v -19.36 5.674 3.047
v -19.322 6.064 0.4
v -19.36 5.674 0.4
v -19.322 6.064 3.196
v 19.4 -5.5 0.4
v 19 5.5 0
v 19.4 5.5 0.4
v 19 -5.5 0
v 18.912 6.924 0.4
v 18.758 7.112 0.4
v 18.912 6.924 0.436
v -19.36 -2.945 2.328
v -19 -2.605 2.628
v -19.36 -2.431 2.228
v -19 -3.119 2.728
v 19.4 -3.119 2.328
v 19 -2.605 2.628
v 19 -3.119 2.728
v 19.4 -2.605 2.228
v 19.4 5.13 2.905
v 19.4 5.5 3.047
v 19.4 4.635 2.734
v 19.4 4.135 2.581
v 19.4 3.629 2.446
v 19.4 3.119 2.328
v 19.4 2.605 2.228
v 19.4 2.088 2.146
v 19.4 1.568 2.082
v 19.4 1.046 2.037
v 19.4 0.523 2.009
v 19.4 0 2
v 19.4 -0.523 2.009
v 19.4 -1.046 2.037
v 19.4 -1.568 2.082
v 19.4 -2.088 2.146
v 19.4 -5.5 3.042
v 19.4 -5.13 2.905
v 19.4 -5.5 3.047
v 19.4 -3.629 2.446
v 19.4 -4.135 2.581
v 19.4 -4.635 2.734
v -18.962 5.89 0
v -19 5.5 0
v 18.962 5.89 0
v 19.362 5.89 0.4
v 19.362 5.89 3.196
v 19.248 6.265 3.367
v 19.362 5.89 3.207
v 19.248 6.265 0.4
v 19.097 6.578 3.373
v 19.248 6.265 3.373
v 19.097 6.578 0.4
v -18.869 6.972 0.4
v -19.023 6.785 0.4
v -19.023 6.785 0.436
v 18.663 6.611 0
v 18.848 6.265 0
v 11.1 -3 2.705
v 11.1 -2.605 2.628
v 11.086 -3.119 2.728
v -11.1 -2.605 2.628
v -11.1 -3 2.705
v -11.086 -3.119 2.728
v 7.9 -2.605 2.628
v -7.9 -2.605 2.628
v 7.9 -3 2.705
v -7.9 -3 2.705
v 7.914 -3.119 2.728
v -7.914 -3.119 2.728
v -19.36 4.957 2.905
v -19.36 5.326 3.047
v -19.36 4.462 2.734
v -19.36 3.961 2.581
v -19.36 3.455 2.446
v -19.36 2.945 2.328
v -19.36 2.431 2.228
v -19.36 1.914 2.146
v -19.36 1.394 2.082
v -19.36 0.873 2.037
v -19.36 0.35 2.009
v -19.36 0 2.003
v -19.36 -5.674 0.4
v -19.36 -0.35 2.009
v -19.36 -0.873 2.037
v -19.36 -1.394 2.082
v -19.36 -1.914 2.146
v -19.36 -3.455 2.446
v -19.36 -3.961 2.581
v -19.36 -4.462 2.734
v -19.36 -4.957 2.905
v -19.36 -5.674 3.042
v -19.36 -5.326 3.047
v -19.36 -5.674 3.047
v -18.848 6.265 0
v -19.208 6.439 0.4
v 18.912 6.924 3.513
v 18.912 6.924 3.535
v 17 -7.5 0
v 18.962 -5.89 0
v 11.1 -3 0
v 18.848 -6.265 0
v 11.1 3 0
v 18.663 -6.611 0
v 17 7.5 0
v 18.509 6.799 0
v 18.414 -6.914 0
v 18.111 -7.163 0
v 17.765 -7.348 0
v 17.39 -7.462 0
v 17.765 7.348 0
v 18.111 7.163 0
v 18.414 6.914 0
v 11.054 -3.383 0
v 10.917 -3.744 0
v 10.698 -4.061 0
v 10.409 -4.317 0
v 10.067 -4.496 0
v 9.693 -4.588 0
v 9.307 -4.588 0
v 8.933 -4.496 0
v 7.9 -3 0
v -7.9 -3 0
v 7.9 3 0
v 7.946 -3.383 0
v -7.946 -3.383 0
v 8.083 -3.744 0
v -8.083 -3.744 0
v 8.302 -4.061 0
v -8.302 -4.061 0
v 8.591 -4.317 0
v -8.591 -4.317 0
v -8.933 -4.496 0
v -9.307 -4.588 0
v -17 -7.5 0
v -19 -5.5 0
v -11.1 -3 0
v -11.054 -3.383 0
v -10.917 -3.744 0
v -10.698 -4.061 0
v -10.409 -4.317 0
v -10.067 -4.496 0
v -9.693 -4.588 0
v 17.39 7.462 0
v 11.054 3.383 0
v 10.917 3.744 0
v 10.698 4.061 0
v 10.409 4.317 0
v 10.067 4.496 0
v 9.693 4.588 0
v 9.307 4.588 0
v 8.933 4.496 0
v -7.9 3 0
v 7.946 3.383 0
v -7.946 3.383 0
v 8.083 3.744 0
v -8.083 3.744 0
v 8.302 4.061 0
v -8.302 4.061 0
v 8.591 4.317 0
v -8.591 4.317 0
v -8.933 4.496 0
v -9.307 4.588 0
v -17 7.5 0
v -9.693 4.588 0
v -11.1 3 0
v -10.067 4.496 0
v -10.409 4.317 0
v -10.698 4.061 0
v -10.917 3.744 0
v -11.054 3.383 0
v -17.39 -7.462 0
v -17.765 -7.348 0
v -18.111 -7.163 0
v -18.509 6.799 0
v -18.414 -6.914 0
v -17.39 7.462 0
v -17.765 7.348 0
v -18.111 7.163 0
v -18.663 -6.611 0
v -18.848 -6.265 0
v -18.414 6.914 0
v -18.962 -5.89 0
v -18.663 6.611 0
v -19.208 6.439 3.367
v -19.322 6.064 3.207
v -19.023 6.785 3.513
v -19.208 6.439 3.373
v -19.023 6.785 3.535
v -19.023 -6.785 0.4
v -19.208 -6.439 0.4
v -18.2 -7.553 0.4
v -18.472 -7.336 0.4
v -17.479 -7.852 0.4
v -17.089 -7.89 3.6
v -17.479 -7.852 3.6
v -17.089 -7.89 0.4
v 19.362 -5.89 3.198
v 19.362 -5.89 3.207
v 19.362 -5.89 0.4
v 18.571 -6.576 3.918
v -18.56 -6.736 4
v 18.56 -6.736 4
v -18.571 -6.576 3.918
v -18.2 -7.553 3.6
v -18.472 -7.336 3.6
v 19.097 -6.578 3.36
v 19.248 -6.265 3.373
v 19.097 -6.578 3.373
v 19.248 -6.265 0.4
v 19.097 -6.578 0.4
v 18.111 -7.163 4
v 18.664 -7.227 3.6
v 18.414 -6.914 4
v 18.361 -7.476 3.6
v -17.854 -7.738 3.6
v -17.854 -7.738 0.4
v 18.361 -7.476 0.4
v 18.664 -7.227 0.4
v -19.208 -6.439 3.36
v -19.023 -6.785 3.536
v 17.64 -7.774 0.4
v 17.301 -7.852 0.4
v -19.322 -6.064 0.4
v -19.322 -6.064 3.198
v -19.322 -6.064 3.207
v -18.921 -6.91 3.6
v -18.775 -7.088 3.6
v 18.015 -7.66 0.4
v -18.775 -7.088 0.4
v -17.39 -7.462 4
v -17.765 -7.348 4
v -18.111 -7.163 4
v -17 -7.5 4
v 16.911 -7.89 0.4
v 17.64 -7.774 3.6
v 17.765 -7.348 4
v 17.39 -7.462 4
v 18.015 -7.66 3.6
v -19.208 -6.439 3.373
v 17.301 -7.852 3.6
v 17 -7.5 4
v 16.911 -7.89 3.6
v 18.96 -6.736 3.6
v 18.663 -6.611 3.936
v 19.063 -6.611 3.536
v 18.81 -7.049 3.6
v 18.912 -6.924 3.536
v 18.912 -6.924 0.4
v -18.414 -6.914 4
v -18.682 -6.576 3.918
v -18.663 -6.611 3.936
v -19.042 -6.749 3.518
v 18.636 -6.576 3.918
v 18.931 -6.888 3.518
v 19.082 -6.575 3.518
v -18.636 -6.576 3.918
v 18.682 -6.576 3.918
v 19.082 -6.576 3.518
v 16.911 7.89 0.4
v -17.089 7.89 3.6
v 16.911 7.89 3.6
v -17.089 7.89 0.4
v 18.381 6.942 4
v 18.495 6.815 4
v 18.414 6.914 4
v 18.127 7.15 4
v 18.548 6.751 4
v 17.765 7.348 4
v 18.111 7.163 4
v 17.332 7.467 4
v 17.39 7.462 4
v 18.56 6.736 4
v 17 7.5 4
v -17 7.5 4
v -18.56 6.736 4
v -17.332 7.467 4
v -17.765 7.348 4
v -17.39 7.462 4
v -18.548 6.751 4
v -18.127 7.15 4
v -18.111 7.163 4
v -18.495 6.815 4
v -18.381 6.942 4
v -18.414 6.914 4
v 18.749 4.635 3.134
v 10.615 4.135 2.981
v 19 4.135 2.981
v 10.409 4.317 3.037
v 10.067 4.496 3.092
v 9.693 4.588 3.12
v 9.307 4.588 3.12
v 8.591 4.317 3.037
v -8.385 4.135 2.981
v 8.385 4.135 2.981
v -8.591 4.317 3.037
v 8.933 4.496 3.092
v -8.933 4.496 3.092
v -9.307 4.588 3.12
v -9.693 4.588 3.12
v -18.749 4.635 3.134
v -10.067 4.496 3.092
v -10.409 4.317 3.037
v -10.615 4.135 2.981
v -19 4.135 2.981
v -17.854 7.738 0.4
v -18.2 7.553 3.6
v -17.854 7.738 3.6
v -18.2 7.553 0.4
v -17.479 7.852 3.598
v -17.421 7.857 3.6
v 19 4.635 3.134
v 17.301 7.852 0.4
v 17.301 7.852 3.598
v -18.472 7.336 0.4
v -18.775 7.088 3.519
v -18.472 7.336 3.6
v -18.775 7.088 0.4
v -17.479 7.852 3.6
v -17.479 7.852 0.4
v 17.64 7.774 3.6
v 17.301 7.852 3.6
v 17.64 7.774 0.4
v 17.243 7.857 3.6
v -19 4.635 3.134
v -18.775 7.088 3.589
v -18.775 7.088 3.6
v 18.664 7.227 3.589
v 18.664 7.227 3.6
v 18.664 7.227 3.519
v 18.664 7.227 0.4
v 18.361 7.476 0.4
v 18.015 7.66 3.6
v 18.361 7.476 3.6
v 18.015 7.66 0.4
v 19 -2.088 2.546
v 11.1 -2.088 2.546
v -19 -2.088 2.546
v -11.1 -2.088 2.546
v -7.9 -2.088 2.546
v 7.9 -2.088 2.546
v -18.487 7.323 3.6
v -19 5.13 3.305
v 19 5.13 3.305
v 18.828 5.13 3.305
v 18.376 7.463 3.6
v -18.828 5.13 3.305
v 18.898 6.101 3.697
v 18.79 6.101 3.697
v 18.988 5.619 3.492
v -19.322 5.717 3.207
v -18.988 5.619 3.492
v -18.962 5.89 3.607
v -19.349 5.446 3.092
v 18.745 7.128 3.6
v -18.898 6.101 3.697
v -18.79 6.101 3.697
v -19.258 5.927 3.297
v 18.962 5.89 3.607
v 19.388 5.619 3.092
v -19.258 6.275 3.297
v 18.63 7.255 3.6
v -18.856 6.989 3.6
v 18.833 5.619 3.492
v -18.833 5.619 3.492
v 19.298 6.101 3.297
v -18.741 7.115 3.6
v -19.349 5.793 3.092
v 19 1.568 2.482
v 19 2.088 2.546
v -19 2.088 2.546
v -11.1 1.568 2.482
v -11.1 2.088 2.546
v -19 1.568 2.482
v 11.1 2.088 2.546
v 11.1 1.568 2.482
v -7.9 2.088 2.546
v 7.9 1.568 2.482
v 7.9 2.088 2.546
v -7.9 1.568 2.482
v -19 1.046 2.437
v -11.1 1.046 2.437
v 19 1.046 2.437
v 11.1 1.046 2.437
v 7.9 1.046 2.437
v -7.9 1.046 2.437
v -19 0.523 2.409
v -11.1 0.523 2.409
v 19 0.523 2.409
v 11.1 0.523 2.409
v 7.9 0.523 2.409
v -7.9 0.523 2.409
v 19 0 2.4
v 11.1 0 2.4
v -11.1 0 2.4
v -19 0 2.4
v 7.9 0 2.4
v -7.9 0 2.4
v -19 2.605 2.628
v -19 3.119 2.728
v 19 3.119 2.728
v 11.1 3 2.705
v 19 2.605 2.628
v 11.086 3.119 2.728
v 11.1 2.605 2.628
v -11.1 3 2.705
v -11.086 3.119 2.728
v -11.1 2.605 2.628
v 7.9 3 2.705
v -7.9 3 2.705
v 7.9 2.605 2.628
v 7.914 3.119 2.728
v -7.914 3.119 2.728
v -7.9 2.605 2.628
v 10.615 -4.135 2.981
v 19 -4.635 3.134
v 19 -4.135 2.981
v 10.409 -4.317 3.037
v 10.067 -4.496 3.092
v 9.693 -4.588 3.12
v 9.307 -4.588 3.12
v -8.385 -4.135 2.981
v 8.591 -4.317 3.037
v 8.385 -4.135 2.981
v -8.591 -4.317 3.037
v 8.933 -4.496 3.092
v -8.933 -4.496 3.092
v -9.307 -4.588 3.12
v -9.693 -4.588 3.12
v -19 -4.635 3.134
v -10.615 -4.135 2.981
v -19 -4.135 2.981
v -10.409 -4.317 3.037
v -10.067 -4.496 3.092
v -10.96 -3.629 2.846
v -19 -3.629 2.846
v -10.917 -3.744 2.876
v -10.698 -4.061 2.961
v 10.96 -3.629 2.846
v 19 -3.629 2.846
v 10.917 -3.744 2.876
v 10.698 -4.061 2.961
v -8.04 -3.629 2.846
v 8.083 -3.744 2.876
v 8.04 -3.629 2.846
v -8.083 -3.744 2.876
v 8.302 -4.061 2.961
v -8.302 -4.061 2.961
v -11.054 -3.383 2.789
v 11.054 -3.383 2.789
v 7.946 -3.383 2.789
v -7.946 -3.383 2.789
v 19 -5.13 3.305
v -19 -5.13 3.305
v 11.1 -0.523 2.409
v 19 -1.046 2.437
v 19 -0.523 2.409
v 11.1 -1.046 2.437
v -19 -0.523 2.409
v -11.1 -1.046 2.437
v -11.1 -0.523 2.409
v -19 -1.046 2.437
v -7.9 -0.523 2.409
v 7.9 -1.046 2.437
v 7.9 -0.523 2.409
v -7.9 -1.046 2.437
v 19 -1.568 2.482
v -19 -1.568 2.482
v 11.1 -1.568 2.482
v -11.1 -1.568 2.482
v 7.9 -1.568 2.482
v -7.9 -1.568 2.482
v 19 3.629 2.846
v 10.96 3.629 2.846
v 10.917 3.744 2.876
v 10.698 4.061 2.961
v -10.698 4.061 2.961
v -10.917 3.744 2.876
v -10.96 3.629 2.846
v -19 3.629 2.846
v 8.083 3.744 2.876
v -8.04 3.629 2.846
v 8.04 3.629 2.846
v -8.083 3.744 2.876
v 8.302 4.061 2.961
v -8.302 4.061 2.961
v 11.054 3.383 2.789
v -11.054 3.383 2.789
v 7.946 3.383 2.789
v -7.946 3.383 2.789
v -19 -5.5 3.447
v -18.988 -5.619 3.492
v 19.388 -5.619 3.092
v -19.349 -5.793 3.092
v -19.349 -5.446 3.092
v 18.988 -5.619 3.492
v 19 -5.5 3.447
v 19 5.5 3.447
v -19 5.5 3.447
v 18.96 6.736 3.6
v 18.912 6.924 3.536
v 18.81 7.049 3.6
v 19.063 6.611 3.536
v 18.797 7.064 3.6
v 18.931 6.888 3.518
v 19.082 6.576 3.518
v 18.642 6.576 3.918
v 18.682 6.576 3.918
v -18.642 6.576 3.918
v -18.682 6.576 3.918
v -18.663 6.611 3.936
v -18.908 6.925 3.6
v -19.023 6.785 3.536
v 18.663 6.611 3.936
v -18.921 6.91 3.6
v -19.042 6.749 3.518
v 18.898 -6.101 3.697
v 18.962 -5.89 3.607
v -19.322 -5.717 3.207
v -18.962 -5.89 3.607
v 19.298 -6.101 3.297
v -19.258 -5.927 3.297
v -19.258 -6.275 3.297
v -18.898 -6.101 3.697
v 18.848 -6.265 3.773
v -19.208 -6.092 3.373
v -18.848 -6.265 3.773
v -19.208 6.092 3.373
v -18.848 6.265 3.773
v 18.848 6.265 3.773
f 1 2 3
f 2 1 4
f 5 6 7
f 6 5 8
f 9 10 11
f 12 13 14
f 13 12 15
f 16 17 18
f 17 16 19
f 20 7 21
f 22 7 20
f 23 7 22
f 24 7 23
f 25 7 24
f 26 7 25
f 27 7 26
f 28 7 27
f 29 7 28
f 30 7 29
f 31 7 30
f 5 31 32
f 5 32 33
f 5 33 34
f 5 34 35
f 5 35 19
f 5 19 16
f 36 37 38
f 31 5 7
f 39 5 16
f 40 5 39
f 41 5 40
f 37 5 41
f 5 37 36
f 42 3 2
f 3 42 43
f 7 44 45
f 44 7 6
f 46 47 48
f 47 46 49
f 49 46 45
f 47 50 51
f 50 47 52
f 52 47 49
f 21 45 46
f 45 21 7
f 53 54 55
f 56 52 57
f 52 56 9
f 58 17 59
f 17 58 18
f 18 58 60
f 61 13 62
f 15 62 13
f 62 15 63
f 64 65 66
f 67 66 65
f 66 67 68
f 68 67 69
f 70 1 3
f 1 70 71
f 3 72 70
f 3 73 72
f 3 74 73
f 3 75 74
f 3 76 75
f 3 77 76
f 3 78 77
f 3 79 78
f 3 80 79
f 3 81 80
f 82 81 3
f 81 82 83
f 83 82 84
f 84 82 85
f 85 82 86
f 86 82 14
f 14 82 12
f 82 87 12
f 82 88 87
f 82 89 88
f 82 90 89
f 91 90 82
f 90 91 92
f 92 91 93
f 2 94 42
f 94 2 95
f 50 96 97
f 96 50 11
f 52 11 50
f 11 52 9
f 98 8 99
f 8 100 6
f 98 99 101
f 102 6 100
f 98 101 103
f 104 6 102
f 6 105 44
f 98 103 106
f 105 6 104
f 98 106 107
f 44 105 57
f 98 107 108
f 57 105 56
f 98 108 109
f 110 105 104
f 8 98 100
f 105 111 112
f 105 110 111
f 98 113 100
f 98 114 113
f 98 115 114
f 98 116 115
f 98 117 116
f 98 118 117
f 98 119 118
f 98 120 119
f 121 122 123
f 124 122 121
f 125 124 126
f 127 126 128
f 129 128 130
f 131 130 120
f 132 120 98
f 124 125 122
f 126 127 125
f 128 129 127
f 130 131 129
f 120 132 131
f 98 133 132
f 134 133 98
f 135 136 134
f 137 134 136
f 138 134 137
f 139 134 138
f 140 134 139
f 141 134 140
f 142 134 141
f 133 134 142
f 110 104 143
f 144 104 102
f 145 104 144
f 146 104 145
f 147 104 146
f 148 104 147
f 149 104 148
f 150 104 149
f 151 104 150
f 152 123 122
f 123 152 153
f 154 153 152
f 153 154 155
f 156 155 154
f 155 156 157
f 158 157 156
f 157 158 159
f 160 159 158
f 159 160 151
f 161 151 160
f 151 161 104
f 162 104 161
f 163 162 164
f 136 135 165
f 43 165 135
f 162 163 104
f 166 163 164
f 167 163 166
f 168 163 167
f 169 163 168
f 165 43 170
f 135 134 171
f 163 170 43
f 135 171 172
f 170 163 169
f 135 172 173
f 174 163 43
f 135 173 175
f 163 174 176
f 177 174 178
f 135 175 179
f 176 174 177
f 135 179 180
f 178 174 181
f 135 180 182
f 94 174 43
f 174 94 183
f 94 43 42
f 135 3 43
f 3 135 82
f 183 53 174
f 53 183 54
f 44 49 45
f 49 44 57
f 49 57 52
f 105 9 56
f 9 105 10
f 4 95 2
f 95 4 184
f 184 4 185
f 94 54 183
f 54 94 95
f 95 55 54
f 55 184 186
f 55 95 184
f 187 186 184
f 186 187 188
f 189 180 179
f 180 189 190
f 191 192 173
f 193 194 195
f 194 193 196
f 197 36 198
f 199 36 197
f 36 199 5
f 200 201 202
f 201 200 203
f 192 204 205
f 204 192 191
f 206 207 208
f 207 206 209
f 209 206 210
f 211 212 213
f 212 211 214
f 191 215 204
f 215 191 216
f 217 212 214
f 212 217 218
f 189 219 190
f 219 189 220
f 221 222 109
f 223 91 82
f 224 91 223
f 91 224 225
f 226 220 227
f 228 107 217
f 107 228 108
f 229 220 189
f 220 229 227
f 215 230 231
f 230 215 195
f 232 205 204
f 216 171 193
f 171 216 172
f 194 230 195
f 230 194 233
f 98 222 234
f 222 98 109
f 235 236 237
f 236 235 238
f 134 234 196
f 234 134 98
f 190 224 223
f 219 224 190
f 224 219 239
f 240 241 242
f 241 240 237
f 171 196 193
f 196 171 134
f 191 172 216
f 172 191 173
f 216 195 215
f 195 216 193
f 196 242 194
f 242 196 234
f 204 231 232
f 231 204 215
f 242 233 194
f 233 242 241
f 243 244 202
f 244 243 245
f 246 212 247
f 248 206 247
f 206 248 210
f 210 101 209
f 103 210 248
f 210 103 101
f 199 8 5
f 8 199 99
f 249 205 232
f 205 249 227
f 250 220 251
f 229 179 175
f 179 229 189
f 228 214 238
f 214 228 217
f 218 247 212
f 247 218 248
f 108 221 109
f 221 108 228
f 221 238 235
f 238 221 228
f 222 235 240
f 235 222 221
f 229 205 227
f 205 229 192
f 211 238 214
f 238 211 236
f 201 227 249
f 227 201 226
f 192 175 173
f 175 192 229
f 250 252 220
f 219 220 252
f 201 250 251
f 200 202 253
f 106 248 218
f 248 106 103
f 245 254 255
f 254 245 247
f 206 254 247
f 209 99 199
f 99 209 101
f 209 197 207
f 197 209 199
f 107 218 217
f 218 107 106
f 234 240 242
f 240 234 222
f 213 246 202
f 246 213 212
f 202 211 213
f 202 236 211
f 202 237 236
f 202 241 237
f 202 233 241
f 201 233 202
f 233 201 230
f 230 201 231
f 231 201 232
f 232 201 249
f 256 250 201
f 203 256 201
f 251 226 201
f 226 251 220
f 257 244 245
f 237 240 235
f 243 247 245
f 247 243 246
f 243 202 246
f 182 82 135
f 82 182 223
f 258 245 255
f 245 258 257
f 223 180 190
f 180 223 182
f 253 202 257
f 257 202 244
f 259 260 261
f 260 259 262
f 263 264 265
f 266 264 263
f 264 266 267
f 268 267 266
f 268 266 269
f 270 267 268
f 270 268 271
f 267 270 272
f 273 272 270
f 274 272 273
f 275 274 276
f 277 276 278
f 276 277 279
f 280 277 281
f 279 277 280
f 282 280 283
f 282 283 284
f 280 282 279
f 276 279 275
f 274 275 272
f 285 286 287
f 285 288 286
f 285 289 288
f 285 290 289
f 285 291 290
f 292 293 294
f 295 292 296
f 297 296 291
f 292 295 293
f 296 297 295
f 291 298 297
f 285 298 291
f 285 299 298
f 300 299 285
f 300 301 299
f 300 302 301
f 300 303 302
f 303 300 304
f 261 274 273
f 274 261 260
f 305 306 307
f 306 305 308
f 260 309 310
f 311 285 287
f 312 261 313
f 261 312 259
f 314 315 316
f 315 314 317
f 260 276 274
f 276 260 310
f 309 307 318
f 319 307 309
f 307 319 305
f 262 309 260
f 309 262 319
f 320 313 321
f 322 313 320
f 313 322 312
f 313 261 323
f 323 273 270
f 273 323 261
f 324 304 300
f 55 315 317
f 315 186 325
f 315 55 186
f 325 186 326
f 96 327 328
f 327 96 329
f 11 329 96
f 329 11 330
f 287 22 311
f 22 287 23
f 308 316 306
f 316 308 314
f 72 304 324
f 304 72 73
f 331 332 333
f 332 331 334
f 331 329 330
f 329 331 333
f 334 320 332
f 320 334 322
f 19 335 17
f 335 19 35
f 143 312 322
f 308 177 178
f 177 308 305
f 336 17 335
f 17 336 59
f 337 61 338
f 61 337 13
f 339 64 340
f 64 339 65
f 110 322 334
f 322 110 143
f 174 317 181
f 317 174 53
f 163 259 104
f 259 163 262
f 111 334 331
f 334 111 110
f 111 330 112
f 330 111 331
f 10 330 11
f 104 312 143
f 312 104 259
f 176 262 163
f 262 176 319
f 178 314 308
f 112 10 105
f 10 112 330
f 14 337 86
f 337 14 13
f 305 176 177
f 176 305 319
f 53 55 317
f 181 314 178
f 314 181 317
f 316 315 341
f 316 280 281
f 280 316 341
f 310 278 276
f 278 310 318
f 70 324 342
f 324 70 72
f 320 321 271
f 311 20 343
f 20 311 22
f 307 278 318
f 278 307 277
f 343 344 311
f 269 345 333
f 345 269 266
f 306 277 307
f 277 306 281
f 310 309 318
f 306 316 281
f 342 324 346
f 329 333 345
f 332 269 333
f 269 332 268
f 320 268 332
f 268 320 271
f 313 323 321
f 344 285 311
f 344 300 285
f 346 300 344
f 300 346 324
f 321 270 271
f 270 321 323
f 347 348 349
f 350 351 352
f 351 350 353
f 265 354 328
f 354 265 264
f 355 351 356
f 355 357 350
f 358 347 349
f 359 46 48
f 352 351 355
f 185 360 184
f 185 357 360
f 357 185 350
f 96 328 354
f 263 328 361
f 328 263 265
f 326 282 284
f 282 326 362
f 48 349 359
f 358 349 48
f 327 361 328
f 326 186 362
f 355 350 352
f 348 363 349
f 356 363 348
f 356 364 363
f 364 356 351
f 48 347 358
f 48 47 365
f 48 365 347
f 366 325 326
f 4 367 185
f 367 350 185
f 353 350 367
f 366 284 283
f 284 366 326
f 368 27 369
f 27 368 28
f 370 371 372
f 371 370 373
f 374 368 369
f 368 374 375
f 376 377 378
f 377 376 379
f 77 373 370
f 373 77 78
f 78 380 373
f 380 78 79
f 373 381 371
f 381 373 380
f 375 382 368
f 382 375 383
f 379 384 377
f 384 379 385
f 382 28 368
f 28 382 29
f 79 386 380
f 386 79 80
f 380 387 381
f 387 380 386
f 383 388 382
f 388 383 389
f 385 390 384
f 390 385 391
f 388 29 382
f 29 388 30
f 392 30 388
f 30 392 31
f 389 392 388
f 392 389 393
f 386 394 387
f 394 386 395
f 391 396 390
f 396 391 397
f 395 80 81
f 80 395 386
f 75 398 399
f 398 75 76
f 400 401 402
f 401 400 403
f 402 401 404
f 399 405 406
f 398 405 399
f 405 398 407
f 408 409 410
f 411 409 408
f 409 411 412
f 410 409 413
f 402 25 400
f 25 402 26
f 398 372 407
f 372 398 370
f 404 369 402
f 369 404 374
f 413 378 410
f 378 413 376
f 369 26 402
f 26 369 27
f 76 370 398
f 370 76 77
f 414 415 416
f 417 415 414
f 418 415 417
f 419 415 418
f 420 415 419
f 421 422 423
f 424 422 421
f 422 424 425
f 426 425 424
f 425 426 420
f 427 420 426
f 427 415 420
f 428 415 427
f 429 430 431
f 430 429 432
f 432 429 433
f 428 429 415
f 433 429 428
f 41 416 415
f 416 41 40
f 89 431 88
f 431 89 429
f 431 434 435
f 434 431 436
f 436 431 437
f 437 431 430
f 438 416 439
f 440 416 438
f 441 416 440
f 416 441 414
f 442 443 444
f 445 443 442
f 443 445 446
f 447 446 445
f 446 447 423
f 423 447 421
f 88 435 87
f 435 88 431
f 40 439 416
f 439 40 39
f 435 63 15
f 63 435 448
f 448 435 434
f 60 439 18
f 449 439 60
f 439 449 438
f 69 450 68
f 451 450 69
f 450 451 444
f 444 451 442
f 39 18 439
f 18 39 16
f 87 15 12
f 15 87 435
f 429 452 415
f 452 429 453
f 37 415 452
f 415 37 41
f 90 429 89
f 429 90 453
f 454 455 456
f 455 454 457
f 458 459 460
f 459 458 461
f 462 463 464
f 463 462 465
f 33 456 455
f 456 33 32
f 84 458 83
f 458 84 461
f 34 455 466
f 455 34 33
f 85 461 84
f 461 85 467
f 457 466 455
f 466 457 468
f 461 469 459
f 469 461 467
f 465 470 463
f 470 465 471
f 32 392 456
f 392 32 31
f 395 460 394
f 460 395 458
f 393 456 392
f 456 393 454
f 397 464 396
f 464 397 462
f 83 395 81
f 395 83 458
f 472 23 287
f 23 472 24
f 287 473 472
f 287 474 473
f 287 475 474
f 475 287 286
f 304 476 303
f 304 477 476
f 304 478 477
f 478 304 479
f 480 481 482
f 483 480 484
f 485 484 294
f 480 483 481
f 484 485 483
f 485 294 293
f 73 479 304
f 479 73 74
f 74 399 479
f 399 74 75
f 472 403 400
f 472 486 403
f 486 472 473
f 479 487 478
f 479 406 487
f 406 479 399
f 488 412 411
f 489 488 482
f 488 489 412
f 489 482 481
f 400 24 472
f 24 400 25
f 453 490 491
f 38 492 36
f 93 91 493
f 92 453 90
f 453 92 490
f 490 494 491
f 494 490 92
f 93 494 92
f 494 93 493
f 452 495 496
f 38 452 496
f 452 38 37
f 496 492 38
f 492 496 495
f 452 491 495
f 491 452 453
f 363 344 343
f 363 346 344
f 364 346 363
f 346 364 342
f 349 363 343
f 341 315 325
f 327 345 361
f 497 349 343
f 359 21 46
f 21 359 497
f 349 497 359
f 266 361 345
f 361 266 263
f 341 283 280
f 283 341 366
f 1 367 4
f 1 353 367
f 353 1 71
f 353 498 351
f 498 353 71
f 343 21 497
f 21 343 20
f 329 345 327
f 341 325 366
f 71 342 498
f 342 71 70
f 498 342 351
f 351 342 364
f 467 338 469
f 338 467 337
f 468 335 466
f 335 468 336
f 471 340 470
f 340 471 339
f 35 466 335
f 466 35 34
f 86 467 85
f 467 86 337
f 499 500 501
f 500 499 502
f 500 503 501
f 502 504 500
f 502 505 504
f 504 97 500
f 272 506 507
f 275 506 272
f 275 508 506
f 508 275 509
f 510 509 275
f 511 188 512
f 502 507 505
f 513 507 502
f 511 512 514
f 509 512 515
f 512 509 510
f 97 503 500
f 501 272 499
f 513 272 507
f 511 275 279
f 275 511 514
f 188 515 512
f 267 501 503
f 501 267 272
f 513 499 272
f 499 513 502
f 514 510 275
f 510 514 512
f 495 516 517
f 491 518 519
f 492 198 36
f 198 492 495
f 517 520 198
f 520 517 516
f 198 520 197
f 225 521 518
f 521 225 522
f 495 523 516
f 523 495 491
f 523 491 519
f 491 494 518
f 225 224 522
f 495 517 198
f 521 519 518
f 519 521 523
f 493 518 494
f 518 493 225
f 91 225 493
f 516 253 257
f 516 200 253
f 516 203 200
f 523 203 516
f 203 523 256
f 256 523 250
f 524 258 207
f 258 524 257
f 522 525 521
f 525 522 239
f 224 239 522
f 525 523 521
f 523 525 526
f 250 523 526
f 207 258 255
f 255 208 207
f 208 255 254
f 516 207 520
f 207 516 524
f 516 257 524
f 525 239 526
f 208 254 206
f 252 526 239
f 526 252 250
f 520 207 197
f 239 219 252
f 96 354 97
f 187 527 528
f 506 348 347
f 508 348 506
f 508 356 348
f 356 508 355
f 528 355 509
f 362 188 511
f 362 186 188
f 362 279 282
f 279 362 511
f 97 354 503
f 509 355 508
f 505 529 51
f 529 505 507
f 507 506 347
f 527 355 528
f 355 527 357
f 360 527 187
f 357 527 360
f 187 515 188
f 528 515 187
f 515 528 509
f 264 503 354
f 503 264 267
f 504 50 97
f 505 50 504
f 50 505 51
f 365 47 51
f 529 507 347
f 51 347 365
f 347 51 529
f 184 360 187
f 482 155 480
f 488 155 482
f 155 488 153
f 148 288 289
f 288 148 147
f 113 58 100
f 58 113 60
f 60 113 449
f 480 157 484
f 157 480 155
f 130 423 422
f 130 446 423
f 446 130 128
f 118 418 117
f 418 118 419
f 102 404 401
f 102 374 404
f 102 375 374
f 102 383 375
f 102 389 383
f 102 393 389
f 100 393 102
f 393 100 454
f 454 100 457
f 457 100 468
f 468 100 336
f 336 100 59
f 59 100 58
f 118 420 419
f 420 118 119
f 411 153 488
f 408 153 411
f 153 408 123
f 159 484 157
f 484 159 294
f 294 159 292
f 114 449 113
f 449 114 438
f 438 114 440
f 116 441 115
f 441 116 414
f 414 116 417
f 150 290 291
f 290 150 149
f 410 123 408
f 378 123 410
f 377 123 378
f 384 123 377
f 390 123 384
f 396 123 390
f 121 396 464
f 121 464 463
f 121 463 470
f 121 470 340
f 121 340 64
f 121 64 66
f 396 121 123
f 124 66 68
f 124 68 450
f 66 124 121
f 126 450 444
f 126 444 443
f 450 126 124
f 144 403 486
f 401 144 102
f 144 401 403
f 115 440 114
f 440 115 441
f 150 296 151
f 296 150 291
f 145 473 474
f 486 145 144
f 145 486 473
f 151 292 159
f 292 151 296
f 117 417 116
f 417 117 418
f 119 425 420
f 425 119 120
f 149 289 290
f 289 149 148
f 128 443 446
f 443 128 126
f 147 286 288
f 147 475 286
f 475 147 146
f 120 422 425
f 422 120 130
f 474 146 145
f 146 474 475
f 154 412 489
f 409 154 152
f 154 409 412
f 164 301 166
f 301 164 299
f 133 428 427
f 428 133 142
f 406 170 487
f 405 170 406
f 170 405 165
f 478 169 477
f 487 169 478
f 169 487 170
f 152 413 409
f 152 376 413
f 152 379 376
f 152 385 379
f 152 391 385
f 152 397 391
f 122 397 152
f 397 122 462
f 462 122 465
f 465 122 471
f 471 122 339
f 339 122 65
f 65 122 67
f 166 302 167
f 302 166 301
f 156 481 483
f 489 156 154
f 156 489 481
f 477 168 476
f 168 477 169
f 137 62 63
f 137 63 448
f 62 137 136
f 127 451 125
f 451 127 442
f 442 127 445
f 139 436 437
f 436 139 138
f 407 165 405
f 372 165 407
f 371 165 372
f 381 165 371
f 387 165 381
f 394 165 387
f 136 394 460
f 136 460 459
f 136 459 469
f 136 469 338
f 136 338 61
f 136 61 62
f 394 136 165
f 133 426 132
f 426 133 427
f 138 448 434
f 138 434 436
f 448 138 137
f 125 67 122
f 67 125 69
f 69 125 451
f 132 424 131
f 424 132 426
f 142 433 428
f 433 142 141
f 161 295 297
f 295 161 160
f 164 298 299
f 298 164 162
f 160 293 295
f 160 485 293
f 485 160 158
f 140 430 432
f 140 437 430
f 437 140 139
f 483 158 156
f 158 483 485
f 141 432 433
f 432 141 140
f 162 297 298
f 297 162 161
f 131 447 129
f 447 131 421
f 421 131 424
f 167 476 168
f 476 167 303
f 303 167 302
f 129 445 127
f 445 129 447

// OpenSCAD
/*
 * Controleo3 reflow oven add-ons
 * Enclosure mounting spacer
 * By smkent (GitHub) / bulbasaur0 (Printables)
 *
 * Licensed under Creative Commons (4.0 International License) Attribution-ShareAlike
 */

/* [Size] */
// All units in millimeters

Dimensions = [38, 15];

Thickness = 4; // [1.5:0.1:10]
Diameter = 35;
Hole_Diameter = 16; // [10:0.1:30]
Screw_Hole_Diameter = 3; // [2:0.1:5]
Screw_Hole_Offset = 14;
Screw_Separation = 19;
Grommet_Thickness = 3; // [0.8:0.1:5]
Grommet_Depth = 2; // [0.4:0.1:5]

/* [Advanced Options] */
Screw_Hole_Fit = 0.2; // [0:0.05:1]
Screw_Hole_Style = "inset"; // [flat: Flat, countersink: Countersink, inset: Inset]
Edge_Radius = 0.4; // [0:0.1:3]

/* [Development Toggles] */

module __end_customizer_options__() { }

// Constants //

$fa = $preview ? $fa : 2;
$fs = $preview ? $fs / 2 : 0.4;

slop = 0.001;

// Modules //

module _round_3d(radius = Edge_Radius) {
    if (radius == 0) {
        children();
    } else {
        render()
        minkowski() {
            children();
            for (mz = [0, 1])
            mirror([0, 0, mz])
            cylinder(r1=radius, r2=0, h=radius);
        }
    }
}

module _screw_hole(d, h, fit=0, style="flat", print_upside_down=false) {
    inset_bare_min_h = 1.4;
    inset_min_h = (style == "inset") ? max((h - d), inset_bare_min_h) - (h - d) : 0;
    translate([0, 0, -slop])
    cylinder(d=(d + fit), h=h + slop * 2);
    if (style == "countersink" || style == "inset") {
        translate([0, 0, h + inset_min_h + slop * 2])
        mirror([0, 0, 1])
        cylinder(d1=d * 2, d2=d * (style == "inset" ? 2 : 1), h=d);
    }
    if (style == "inset" && print_upside_down) {
        layer_height = 0.2;
        translate([0, 0, (h + inset_min_h) - d - layer_height])
        linear_extrude(height=layer_height + slop * 2)
        intersection() {
            square([d * 2, d + fit], center=true);
            circle(d=d*2);
        }
    }
}

module at_enclosure_mount_screw_holes() {
    for (mx = [0, 1])
    mirror([mx, 0])
    translate([Screw_Separation / 2, 0])
    children();
}

module enclosure_mount_body() {
    difference() {
        translate([0, 0, Edge_Radius])
        union() {
            rr = 2;
            _round_3d()
            difference() {
                linear_extrude(height=Thickness - Edge_Radius * 2)
                offset(r=rr)
                offset(r=-rr)
                square(Dimensions, center=true);
                translate([0, 0, Dimensions[1] + (Thickness - Edge_Radius * 2) / 2])
                rotate([0, 90, 0])
                cylinder(h=Dimensions[0], d=Dimensions[1] * 2, center=true);
            }
        }
        if(0)
        union() {
            dd = Hole_Diameter - Grommet_Thickness * 2;
            translate([0, 0, slop])
            linear_extrude(height=Thickness + Grommet_Depth + slop * 2)
            circle(d=dd);
            translate([0, 0, -slop])
            cylinder(d2=dd, d1=dd + Edge_Radius * 2, h=Edge_Radius);
            translate([0, 0, Thickness + Grommet_Depth - Edge_Radius + slop])
            cylinder(d1=dd, d2=dd + Edge_Radius * 2, h=Edge_Radius);
        }
    }
}

module enclosure_mount_screw_holes() {
    translate([0, 0, Thickness])
    mirror([0, 0, 1])
    at_enclosure_mount_screw_holes()
    hull() {
        oy = (Dimensions[1] - Screw_Hole_Diameter) / 4;
        for (my = [0, 1])
        mirror([0, my])
        translate([0, oy, 0])
        cylinder(d=Screw_Hole_Diameter + Screw_Hole_Fit, h=Thickness * 2);
    }
}

module panel_grommet() {
    difference() {
        enclosure_mount_body();
        enclosure_mount_screw_holes();
    }
}

module main() {
    color("yellowgreen", 0.8)
    panel_grommet();
}

main();
